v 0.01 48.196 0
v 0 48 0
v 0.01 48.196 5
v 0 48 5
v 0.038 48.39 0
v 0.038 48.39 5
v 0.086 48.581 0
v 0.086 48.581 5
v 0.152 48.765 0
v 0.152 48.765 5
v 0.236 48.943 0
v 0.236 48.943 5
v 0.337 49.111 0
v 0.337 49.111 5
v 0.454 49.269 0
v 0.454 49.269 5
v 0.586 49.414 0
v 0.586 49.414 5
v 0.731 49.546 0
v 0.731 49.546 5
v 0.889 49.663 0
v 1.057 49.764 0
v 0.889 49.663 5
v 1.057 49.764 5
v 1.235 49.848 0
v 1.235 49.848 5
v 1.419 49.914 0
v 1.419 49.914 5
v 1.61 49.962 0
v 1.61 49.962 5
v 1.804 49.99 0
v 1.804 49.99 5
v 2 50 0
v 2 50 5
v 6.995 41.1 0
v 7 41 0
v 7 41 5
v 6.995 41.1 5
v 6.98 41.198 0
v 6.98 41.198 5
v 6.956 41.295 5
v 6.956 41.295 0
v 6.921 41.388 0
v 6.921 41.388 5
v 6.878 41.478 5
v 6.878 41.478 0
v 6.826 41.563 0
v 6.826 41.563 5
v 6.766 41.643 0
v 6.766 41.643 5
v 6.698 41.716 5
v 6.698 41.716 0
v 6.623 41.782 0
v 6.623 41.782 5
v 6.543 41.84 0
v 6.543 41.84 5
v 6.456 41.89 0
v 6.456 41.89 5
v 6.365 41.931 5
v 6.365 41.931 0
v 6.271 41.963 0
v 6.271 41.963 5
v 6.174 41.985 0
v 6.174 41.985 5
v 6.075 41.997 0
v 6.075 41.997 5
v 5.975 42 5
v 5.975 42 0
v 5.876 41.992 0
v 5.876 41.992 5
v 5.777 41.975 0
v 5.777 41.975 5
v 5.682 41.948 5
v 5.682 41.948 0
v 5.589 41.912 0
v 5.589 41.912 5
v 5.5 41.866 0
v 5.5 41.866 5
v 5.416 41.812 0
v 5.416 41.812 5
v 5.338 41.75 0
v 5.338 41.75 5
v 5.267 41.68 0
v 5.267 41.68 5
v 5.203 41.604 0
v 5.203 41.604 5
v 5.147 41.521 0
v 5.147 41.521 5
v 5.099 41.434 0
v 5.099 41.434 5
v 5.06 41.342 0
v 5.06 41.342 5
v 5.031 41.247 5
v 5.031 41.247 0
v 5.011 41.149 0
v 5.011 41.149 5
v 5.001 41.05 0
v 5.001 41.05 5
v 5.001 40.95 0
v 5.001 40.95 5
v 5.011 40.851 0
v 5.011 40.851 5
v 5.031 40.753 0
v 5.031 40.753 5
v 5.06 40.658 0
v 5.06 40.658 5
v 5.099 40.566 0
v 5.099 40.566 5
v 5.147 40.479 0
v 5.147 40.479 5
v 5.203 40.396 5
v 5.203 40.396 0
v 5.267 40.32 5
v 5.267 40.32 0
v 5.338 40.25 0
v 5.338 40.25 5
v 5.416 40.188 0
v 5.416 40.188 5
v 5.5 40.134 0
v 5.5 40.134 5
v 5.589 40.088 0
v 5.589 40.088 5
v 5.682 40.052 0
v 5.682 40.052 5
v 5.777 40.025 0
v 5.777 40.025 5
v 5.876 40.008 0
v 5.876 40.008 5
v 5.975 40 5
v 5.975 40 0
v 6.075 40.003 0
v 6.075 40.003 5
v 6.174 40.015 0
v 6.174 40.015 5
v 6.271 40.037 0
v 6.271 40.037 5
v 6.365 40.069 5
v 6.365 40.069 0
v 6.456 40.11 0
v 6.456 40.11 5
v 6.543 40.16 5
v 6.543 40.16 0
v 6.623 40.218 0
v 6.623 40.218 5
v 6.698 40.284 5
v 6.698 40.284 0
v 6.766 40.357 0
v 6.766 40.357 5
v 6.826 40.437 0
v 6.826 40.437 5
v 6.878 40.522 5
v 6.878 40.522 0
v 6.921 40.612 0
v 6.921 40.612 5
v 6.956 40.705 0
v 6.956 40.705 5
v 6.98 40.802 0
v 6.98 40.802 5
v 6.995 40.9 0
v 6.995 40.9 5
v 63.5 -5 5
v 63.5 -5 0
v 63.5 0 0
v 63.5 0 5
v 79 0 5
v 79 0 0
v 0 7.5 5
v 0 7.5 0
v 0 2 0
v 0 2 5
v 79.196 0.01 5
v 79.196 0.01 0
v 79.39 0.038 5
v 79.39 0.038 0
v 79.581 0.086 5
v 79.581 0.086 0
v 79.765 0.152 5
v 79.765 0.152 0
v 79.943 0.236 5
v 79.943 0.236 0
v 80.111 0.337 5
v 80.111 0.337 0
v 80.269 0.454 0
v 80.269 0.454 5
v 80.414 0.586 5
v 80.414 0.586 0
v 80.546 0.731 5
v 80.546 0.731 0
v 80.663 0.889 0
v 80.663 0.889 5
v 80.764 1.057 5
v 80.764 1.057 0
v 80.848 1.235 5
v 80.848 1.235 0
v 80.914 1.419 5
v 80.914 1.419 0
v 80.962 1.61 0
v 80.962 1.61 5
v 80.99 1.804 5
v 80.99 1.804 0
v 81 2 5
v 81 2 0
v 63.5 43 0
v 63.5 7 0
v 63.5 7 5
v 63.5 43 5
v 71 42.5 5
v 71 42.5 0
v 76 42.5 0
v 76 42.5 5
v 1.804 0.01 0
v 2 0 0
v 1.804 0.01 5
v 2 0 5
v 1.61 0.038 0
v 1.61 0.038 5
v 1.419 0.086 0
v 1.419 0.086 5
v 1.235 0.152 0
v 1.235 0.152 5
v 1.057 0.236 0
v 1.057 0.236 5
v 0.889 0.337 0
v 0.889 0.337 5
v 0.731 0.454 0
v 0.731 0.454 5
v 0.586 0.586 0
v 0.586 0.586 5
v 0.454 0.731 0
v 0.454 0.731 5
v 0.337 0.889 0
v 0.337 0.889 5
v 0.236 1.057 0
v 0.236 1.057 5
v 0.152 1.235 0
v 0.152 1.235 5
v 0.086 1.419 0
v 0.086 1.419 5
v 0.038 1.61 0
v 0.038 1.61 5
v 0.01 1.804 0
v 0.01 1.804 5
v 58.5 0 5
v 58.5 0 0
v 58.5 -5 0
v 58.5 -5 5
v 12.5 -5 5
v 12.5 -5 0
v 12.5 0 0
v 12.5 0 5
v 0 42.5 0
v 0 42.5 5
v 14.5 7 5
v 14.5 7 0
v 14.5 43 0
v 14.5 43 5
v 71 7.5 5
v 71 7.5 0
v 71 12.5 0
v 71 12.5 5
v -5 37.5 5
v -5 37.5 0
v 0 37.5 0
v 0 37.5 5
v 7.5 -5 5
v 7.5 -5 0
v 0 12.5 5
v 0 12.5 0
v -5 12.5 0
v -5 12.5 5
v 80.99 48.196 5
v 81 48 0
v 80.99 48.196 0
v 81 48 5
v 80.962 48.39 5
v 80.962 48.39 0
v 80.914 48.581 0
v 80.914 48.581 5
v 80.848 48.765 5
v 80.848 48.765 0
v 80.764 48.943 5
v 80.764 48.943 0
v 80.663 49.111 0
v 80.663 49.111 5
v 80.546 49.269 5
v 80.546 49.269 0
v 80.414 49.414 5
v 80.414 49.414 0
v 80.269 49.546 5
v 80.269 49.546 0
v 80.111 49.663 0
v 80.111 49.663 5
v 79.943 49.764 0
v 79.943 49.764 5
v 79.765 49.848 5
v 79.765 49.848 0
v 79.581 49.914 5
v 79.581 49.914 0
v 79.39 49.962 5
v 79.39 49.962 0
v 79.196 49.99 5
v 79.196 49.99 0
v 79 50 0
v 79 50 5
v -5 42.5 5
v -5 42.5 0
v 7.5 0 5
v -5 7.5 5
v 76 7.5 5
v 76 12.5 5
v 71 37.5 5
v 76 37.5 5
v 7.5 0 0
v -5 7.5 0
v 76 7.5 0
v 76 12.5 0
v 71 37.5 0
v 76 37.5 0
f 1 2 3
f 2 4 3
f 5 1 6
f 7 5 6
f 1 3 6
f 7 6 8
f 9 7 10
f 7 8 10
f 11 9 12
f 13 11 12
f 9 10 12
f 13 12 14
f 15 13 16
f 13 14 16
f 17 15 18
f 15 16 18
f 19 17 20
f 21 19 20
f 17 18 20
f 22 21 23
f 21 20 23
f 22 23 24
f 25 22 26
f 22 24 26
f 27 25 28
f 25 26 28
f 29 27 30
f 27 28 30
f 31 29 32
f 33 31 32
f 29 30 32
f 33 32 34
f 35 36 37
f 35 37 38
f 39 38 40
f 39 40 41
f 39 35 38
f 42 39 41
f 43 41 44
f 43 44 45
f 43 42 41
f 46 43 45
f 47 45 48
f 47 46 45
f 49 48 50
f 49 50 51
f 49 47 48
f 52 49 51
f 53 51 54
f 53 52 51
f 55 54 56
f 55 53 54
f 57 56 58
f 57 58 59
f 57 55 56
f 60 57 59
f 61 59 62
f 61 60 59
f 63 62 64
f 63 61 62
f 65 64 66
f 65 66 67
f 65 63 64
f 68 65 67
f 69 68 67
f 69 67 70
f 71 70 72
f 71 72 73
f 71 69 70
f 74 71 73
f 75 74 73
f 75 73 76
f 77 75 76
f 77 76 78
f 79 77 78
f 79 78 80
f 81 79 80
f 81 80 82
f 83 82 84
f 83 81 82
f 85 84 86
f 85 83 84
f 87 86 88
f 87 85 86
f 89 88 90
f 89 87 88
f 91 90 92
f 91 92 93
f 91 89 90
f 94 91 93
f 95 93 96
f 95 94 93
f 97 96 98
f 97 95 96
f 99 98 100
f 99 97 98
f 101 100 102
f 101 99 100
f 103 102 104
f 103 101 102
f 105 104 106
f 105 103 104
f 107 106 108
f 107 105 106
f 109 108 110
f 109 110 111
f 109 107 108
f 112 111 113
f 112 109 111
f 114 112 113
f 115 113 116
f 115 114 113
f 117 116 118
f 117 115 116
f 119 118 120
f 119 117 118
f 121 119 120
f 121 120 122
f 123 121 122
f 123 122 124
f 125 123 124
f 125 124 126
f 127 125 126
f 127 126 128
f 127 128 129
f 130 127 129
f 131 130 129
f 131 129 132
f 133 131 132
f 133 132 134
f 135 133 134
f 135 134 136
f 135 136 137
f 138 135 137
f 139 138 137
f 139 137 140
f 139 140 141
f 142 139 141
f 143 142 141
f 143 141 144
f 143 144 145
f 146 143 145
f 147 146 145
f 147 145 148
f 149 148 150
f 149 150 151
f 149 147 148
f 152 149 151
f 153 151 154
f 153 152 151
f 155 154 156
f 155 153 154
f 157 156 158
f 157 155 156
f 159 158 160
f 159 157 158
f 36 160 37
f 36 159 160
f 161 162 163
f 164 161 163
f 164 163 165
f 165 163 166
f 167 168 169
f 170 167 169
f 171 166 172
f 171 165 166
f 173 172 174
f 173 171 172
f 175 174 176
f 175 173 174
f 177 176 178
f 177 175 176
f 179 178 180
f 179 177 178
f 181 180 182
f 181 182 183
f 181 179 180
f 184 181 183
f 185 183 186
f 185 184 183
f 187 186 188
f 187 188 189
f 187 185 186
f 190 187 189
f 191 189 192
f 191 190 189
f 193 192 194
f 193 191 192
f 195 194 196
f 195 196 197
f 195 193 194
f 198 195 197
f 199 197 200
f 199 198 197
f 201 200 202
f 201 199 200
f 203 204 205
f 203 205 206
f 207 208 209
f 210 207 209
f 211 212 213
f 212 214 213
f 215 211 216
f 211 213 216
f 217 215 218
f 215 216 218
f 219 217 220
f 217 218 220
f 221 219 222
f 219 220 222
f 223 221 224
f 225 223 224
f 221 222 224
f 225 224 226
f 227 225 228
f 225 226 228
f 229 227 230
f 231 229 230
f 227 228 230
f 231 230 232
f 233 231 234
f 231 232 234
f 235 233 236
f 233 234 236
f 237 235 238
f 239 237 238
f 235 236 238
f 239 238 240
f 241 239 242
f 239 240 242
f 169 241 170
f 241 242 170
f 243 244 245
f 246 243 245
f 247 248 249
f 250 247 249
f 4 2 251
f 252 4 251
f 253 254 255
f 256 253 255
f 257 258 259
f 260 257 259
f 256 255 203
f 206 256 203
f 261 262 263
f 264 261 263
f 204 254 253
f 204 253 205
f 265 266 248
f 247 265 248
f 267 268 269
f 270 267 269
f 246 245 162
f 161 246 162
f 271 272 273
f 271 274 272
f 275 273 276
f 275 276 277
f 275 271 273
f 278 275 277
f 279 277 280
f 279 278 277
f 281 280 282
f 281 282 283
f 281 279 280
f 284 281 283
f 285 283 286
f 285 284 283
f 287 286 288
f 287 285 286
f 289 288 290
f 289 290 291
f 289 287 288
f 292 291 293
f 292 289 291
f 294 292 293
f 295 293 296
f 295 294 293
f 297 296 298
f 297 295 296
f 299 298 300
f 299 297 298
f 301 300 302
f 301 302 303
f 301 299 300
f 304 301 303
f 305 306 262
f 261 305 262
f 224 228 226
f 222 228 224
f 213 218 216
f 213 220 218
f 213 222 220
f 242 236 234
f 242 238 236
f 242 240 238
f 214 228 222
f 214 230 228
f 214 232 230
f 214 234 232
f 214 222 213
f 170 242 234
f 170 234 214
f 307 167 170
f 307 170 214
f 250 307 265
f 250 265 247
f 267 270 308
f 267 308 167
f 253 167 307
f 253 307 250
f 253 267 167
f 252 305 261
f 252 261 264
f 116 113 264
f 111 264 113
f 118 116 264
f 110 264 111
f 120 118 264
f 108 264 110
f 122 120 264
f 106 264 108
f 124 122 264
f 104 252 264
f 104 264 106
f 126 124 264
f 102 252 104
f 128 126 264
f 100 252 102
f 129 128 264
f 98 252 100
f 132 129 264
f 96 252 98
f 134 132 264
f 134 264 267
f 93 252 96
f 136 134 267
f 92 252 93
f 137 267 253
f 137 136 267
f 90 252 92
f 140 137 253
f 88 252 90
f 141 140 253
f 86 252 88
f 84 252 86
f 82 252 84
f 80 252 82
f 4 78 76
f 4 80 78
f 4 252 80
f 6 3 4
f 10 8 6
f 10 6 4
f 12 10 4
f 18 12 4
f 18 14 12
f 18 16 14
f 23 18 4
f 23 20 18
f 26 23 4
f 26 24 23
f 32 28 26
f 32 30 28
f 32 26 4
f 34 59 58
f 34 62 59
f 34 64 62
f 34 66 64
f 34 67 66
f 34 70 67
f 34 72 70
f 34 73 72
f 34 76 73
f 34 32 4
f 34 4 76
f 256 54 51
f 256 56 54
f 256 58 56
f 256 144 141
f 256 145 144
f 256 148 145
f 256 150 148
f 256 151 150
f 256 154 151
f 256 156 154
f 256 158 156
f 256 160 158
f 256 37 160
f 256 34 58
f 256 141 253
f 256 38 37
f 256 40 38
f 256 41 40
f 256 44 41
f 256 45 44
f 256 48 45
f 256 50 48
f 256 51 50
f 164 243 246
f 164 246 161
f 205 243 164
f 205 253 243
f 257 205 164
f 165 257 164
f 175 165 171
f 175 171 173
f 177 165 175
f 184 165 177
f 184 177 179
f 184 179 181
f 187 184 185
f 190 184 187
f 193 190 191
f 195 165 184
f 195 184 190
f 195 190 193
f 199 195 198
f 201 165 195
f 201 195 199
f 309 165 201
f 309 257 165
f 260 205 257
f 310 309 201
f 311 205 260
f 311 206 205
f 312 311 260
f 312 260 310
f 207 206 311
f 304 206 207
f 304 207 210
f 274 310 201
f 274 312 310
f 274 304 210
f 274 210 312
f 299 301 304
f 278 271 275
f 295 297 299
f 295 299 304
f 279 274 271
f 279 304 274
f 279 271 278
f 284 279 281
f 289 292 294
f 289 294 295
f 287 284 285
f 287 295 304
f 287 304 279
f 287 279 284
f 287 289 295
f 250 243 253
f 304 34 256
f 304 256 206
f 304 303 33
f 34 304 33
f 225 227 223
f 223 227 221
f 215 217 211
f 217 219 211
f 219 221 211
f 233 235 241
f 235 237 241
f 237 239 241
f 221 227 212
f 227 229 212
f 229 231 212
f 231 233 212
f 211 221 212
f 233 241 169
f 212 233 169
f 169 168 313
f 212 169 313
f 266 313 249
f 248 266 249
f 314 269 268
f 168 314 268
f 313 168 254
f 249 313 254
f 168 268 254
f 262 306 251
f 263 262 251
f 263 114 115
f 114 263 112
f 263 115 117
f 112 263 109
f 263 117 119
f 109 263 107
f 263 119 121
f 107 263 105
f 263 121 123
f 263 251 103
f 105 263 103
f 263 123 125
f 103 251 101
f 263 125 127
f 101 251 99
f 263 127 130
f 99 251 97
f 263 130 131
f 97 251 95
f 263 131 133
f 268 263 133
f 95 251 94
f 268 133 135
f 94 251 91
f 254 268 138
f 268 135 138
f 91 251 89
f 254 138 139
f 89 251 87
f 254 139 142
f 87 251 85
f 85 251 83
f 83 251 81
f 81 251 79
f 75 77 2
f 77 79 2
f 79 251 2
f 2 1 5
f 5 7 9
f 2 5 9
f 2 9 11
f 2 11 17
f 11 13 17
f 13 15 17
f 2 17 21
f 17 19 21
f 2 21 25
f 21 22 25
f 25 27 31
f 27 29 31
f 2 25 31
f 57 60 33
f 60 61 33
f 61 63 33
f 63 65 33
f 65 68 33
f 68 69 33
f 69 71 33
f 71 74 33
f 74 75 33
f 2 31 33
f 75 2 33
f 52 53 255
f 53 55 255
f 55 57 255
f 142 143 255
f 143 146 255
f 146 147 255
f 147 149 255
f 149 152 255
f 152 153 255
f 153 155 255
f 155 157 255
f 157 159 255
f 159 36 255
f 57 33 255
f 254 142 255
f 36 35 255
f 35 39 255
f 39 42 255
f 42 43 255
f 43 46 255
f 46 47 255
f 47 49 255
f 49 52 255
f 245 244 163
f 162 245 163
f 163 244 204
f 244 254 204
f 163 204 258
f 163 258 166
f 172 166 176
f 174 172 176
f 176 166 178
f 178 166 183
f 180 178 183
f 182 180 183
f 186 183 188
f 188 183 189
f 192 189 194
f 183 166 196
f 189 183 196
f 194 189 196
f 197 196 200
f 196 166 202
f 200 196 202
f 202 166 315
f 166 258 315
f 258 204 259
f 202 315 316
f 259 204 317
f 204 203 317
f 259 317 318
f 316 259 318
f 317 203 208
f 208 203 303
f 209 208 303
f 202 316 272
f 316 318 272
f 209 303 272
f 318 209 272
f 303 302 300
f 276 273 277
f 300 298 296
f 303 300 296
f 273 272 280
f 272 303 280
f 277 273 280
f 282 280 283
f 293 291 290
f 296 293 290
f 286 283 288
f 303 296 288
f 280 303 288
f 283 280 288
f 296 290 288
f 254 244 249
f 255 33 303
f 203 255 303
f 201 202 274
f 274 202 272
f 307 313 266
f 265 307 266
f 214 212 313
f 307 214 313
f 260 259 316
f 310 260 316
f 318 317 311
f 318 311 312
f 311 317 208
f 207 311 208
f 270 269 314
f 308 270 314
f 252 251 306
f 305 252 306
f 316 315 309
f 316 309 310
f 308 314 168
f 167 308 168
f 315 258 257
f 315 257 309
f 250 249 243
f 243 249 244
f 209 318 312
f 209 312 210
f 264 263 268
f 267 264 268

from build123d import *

# Parameters (mm, degrees)
ESQUISSE1_R        = 1
ESQUISSE1_W        = 5
ESQUISSE1_H        = 5
ESQUISSE1_W_2      = 49
ESQUISSE1_H_2      = 36
BOSS_EXTRU_1_DEPTH = 5
CONG_1_R           = 2


with BuildPart() as part:
    # Esquisse1 → Boss.-Extru.1 (new body)
    with BuildSketch(Plane.XY):
        Polygon((0, 0), (7.5, 0), (7.5, -5), (12.5, -5), (12.5, 0), (58.5, 0), (58.5, -5), (63.5, -5), (63.5, 0), (71, 0), (81, 0), (81, 50), (71, 50), (0, 50), (0, 42.5), (-5, 42.5), (-5, 37.5), (0, 37.5), (0, 12.5), (-5, 12.5), (-5, 7.5), (0, 7.5), align=None)
        with Locations((6, 41)):
            Circle(ESQUISSE1_R, mode=Mode.SUBTRACT)
        with Locations((73.5, 10)):
            Rectangle(ESQUISSE1_W, ESQUISSE1_H, mode=Mode.SUBTRACT)
        with Locations((73.5, 40)):
            Rectangle(ESQUISSE1_W, ESQUISSE1_H, mode=Mode.SUBTRACT)
        with Locations((39, 25)):
            Rectangle(ESQUISSE1_W_2, ESQUISSE1_H_2, mode=Mode.SUBTRACT)
    extrude(amount=BOSS_EXTRU_1_DEPTH)

    # Congé1
    cong_1_edges = [part.edges().sort_by_distance(p)[0] for p in [
        (0, 50, 2.5),
        (81, 50, 2.5),
        (81, 0, 2.5),
        (0, 0, 2.5),
    ]]
    fillet(cong_1_edges, radius=CONG_1_R)


solid = part.part
